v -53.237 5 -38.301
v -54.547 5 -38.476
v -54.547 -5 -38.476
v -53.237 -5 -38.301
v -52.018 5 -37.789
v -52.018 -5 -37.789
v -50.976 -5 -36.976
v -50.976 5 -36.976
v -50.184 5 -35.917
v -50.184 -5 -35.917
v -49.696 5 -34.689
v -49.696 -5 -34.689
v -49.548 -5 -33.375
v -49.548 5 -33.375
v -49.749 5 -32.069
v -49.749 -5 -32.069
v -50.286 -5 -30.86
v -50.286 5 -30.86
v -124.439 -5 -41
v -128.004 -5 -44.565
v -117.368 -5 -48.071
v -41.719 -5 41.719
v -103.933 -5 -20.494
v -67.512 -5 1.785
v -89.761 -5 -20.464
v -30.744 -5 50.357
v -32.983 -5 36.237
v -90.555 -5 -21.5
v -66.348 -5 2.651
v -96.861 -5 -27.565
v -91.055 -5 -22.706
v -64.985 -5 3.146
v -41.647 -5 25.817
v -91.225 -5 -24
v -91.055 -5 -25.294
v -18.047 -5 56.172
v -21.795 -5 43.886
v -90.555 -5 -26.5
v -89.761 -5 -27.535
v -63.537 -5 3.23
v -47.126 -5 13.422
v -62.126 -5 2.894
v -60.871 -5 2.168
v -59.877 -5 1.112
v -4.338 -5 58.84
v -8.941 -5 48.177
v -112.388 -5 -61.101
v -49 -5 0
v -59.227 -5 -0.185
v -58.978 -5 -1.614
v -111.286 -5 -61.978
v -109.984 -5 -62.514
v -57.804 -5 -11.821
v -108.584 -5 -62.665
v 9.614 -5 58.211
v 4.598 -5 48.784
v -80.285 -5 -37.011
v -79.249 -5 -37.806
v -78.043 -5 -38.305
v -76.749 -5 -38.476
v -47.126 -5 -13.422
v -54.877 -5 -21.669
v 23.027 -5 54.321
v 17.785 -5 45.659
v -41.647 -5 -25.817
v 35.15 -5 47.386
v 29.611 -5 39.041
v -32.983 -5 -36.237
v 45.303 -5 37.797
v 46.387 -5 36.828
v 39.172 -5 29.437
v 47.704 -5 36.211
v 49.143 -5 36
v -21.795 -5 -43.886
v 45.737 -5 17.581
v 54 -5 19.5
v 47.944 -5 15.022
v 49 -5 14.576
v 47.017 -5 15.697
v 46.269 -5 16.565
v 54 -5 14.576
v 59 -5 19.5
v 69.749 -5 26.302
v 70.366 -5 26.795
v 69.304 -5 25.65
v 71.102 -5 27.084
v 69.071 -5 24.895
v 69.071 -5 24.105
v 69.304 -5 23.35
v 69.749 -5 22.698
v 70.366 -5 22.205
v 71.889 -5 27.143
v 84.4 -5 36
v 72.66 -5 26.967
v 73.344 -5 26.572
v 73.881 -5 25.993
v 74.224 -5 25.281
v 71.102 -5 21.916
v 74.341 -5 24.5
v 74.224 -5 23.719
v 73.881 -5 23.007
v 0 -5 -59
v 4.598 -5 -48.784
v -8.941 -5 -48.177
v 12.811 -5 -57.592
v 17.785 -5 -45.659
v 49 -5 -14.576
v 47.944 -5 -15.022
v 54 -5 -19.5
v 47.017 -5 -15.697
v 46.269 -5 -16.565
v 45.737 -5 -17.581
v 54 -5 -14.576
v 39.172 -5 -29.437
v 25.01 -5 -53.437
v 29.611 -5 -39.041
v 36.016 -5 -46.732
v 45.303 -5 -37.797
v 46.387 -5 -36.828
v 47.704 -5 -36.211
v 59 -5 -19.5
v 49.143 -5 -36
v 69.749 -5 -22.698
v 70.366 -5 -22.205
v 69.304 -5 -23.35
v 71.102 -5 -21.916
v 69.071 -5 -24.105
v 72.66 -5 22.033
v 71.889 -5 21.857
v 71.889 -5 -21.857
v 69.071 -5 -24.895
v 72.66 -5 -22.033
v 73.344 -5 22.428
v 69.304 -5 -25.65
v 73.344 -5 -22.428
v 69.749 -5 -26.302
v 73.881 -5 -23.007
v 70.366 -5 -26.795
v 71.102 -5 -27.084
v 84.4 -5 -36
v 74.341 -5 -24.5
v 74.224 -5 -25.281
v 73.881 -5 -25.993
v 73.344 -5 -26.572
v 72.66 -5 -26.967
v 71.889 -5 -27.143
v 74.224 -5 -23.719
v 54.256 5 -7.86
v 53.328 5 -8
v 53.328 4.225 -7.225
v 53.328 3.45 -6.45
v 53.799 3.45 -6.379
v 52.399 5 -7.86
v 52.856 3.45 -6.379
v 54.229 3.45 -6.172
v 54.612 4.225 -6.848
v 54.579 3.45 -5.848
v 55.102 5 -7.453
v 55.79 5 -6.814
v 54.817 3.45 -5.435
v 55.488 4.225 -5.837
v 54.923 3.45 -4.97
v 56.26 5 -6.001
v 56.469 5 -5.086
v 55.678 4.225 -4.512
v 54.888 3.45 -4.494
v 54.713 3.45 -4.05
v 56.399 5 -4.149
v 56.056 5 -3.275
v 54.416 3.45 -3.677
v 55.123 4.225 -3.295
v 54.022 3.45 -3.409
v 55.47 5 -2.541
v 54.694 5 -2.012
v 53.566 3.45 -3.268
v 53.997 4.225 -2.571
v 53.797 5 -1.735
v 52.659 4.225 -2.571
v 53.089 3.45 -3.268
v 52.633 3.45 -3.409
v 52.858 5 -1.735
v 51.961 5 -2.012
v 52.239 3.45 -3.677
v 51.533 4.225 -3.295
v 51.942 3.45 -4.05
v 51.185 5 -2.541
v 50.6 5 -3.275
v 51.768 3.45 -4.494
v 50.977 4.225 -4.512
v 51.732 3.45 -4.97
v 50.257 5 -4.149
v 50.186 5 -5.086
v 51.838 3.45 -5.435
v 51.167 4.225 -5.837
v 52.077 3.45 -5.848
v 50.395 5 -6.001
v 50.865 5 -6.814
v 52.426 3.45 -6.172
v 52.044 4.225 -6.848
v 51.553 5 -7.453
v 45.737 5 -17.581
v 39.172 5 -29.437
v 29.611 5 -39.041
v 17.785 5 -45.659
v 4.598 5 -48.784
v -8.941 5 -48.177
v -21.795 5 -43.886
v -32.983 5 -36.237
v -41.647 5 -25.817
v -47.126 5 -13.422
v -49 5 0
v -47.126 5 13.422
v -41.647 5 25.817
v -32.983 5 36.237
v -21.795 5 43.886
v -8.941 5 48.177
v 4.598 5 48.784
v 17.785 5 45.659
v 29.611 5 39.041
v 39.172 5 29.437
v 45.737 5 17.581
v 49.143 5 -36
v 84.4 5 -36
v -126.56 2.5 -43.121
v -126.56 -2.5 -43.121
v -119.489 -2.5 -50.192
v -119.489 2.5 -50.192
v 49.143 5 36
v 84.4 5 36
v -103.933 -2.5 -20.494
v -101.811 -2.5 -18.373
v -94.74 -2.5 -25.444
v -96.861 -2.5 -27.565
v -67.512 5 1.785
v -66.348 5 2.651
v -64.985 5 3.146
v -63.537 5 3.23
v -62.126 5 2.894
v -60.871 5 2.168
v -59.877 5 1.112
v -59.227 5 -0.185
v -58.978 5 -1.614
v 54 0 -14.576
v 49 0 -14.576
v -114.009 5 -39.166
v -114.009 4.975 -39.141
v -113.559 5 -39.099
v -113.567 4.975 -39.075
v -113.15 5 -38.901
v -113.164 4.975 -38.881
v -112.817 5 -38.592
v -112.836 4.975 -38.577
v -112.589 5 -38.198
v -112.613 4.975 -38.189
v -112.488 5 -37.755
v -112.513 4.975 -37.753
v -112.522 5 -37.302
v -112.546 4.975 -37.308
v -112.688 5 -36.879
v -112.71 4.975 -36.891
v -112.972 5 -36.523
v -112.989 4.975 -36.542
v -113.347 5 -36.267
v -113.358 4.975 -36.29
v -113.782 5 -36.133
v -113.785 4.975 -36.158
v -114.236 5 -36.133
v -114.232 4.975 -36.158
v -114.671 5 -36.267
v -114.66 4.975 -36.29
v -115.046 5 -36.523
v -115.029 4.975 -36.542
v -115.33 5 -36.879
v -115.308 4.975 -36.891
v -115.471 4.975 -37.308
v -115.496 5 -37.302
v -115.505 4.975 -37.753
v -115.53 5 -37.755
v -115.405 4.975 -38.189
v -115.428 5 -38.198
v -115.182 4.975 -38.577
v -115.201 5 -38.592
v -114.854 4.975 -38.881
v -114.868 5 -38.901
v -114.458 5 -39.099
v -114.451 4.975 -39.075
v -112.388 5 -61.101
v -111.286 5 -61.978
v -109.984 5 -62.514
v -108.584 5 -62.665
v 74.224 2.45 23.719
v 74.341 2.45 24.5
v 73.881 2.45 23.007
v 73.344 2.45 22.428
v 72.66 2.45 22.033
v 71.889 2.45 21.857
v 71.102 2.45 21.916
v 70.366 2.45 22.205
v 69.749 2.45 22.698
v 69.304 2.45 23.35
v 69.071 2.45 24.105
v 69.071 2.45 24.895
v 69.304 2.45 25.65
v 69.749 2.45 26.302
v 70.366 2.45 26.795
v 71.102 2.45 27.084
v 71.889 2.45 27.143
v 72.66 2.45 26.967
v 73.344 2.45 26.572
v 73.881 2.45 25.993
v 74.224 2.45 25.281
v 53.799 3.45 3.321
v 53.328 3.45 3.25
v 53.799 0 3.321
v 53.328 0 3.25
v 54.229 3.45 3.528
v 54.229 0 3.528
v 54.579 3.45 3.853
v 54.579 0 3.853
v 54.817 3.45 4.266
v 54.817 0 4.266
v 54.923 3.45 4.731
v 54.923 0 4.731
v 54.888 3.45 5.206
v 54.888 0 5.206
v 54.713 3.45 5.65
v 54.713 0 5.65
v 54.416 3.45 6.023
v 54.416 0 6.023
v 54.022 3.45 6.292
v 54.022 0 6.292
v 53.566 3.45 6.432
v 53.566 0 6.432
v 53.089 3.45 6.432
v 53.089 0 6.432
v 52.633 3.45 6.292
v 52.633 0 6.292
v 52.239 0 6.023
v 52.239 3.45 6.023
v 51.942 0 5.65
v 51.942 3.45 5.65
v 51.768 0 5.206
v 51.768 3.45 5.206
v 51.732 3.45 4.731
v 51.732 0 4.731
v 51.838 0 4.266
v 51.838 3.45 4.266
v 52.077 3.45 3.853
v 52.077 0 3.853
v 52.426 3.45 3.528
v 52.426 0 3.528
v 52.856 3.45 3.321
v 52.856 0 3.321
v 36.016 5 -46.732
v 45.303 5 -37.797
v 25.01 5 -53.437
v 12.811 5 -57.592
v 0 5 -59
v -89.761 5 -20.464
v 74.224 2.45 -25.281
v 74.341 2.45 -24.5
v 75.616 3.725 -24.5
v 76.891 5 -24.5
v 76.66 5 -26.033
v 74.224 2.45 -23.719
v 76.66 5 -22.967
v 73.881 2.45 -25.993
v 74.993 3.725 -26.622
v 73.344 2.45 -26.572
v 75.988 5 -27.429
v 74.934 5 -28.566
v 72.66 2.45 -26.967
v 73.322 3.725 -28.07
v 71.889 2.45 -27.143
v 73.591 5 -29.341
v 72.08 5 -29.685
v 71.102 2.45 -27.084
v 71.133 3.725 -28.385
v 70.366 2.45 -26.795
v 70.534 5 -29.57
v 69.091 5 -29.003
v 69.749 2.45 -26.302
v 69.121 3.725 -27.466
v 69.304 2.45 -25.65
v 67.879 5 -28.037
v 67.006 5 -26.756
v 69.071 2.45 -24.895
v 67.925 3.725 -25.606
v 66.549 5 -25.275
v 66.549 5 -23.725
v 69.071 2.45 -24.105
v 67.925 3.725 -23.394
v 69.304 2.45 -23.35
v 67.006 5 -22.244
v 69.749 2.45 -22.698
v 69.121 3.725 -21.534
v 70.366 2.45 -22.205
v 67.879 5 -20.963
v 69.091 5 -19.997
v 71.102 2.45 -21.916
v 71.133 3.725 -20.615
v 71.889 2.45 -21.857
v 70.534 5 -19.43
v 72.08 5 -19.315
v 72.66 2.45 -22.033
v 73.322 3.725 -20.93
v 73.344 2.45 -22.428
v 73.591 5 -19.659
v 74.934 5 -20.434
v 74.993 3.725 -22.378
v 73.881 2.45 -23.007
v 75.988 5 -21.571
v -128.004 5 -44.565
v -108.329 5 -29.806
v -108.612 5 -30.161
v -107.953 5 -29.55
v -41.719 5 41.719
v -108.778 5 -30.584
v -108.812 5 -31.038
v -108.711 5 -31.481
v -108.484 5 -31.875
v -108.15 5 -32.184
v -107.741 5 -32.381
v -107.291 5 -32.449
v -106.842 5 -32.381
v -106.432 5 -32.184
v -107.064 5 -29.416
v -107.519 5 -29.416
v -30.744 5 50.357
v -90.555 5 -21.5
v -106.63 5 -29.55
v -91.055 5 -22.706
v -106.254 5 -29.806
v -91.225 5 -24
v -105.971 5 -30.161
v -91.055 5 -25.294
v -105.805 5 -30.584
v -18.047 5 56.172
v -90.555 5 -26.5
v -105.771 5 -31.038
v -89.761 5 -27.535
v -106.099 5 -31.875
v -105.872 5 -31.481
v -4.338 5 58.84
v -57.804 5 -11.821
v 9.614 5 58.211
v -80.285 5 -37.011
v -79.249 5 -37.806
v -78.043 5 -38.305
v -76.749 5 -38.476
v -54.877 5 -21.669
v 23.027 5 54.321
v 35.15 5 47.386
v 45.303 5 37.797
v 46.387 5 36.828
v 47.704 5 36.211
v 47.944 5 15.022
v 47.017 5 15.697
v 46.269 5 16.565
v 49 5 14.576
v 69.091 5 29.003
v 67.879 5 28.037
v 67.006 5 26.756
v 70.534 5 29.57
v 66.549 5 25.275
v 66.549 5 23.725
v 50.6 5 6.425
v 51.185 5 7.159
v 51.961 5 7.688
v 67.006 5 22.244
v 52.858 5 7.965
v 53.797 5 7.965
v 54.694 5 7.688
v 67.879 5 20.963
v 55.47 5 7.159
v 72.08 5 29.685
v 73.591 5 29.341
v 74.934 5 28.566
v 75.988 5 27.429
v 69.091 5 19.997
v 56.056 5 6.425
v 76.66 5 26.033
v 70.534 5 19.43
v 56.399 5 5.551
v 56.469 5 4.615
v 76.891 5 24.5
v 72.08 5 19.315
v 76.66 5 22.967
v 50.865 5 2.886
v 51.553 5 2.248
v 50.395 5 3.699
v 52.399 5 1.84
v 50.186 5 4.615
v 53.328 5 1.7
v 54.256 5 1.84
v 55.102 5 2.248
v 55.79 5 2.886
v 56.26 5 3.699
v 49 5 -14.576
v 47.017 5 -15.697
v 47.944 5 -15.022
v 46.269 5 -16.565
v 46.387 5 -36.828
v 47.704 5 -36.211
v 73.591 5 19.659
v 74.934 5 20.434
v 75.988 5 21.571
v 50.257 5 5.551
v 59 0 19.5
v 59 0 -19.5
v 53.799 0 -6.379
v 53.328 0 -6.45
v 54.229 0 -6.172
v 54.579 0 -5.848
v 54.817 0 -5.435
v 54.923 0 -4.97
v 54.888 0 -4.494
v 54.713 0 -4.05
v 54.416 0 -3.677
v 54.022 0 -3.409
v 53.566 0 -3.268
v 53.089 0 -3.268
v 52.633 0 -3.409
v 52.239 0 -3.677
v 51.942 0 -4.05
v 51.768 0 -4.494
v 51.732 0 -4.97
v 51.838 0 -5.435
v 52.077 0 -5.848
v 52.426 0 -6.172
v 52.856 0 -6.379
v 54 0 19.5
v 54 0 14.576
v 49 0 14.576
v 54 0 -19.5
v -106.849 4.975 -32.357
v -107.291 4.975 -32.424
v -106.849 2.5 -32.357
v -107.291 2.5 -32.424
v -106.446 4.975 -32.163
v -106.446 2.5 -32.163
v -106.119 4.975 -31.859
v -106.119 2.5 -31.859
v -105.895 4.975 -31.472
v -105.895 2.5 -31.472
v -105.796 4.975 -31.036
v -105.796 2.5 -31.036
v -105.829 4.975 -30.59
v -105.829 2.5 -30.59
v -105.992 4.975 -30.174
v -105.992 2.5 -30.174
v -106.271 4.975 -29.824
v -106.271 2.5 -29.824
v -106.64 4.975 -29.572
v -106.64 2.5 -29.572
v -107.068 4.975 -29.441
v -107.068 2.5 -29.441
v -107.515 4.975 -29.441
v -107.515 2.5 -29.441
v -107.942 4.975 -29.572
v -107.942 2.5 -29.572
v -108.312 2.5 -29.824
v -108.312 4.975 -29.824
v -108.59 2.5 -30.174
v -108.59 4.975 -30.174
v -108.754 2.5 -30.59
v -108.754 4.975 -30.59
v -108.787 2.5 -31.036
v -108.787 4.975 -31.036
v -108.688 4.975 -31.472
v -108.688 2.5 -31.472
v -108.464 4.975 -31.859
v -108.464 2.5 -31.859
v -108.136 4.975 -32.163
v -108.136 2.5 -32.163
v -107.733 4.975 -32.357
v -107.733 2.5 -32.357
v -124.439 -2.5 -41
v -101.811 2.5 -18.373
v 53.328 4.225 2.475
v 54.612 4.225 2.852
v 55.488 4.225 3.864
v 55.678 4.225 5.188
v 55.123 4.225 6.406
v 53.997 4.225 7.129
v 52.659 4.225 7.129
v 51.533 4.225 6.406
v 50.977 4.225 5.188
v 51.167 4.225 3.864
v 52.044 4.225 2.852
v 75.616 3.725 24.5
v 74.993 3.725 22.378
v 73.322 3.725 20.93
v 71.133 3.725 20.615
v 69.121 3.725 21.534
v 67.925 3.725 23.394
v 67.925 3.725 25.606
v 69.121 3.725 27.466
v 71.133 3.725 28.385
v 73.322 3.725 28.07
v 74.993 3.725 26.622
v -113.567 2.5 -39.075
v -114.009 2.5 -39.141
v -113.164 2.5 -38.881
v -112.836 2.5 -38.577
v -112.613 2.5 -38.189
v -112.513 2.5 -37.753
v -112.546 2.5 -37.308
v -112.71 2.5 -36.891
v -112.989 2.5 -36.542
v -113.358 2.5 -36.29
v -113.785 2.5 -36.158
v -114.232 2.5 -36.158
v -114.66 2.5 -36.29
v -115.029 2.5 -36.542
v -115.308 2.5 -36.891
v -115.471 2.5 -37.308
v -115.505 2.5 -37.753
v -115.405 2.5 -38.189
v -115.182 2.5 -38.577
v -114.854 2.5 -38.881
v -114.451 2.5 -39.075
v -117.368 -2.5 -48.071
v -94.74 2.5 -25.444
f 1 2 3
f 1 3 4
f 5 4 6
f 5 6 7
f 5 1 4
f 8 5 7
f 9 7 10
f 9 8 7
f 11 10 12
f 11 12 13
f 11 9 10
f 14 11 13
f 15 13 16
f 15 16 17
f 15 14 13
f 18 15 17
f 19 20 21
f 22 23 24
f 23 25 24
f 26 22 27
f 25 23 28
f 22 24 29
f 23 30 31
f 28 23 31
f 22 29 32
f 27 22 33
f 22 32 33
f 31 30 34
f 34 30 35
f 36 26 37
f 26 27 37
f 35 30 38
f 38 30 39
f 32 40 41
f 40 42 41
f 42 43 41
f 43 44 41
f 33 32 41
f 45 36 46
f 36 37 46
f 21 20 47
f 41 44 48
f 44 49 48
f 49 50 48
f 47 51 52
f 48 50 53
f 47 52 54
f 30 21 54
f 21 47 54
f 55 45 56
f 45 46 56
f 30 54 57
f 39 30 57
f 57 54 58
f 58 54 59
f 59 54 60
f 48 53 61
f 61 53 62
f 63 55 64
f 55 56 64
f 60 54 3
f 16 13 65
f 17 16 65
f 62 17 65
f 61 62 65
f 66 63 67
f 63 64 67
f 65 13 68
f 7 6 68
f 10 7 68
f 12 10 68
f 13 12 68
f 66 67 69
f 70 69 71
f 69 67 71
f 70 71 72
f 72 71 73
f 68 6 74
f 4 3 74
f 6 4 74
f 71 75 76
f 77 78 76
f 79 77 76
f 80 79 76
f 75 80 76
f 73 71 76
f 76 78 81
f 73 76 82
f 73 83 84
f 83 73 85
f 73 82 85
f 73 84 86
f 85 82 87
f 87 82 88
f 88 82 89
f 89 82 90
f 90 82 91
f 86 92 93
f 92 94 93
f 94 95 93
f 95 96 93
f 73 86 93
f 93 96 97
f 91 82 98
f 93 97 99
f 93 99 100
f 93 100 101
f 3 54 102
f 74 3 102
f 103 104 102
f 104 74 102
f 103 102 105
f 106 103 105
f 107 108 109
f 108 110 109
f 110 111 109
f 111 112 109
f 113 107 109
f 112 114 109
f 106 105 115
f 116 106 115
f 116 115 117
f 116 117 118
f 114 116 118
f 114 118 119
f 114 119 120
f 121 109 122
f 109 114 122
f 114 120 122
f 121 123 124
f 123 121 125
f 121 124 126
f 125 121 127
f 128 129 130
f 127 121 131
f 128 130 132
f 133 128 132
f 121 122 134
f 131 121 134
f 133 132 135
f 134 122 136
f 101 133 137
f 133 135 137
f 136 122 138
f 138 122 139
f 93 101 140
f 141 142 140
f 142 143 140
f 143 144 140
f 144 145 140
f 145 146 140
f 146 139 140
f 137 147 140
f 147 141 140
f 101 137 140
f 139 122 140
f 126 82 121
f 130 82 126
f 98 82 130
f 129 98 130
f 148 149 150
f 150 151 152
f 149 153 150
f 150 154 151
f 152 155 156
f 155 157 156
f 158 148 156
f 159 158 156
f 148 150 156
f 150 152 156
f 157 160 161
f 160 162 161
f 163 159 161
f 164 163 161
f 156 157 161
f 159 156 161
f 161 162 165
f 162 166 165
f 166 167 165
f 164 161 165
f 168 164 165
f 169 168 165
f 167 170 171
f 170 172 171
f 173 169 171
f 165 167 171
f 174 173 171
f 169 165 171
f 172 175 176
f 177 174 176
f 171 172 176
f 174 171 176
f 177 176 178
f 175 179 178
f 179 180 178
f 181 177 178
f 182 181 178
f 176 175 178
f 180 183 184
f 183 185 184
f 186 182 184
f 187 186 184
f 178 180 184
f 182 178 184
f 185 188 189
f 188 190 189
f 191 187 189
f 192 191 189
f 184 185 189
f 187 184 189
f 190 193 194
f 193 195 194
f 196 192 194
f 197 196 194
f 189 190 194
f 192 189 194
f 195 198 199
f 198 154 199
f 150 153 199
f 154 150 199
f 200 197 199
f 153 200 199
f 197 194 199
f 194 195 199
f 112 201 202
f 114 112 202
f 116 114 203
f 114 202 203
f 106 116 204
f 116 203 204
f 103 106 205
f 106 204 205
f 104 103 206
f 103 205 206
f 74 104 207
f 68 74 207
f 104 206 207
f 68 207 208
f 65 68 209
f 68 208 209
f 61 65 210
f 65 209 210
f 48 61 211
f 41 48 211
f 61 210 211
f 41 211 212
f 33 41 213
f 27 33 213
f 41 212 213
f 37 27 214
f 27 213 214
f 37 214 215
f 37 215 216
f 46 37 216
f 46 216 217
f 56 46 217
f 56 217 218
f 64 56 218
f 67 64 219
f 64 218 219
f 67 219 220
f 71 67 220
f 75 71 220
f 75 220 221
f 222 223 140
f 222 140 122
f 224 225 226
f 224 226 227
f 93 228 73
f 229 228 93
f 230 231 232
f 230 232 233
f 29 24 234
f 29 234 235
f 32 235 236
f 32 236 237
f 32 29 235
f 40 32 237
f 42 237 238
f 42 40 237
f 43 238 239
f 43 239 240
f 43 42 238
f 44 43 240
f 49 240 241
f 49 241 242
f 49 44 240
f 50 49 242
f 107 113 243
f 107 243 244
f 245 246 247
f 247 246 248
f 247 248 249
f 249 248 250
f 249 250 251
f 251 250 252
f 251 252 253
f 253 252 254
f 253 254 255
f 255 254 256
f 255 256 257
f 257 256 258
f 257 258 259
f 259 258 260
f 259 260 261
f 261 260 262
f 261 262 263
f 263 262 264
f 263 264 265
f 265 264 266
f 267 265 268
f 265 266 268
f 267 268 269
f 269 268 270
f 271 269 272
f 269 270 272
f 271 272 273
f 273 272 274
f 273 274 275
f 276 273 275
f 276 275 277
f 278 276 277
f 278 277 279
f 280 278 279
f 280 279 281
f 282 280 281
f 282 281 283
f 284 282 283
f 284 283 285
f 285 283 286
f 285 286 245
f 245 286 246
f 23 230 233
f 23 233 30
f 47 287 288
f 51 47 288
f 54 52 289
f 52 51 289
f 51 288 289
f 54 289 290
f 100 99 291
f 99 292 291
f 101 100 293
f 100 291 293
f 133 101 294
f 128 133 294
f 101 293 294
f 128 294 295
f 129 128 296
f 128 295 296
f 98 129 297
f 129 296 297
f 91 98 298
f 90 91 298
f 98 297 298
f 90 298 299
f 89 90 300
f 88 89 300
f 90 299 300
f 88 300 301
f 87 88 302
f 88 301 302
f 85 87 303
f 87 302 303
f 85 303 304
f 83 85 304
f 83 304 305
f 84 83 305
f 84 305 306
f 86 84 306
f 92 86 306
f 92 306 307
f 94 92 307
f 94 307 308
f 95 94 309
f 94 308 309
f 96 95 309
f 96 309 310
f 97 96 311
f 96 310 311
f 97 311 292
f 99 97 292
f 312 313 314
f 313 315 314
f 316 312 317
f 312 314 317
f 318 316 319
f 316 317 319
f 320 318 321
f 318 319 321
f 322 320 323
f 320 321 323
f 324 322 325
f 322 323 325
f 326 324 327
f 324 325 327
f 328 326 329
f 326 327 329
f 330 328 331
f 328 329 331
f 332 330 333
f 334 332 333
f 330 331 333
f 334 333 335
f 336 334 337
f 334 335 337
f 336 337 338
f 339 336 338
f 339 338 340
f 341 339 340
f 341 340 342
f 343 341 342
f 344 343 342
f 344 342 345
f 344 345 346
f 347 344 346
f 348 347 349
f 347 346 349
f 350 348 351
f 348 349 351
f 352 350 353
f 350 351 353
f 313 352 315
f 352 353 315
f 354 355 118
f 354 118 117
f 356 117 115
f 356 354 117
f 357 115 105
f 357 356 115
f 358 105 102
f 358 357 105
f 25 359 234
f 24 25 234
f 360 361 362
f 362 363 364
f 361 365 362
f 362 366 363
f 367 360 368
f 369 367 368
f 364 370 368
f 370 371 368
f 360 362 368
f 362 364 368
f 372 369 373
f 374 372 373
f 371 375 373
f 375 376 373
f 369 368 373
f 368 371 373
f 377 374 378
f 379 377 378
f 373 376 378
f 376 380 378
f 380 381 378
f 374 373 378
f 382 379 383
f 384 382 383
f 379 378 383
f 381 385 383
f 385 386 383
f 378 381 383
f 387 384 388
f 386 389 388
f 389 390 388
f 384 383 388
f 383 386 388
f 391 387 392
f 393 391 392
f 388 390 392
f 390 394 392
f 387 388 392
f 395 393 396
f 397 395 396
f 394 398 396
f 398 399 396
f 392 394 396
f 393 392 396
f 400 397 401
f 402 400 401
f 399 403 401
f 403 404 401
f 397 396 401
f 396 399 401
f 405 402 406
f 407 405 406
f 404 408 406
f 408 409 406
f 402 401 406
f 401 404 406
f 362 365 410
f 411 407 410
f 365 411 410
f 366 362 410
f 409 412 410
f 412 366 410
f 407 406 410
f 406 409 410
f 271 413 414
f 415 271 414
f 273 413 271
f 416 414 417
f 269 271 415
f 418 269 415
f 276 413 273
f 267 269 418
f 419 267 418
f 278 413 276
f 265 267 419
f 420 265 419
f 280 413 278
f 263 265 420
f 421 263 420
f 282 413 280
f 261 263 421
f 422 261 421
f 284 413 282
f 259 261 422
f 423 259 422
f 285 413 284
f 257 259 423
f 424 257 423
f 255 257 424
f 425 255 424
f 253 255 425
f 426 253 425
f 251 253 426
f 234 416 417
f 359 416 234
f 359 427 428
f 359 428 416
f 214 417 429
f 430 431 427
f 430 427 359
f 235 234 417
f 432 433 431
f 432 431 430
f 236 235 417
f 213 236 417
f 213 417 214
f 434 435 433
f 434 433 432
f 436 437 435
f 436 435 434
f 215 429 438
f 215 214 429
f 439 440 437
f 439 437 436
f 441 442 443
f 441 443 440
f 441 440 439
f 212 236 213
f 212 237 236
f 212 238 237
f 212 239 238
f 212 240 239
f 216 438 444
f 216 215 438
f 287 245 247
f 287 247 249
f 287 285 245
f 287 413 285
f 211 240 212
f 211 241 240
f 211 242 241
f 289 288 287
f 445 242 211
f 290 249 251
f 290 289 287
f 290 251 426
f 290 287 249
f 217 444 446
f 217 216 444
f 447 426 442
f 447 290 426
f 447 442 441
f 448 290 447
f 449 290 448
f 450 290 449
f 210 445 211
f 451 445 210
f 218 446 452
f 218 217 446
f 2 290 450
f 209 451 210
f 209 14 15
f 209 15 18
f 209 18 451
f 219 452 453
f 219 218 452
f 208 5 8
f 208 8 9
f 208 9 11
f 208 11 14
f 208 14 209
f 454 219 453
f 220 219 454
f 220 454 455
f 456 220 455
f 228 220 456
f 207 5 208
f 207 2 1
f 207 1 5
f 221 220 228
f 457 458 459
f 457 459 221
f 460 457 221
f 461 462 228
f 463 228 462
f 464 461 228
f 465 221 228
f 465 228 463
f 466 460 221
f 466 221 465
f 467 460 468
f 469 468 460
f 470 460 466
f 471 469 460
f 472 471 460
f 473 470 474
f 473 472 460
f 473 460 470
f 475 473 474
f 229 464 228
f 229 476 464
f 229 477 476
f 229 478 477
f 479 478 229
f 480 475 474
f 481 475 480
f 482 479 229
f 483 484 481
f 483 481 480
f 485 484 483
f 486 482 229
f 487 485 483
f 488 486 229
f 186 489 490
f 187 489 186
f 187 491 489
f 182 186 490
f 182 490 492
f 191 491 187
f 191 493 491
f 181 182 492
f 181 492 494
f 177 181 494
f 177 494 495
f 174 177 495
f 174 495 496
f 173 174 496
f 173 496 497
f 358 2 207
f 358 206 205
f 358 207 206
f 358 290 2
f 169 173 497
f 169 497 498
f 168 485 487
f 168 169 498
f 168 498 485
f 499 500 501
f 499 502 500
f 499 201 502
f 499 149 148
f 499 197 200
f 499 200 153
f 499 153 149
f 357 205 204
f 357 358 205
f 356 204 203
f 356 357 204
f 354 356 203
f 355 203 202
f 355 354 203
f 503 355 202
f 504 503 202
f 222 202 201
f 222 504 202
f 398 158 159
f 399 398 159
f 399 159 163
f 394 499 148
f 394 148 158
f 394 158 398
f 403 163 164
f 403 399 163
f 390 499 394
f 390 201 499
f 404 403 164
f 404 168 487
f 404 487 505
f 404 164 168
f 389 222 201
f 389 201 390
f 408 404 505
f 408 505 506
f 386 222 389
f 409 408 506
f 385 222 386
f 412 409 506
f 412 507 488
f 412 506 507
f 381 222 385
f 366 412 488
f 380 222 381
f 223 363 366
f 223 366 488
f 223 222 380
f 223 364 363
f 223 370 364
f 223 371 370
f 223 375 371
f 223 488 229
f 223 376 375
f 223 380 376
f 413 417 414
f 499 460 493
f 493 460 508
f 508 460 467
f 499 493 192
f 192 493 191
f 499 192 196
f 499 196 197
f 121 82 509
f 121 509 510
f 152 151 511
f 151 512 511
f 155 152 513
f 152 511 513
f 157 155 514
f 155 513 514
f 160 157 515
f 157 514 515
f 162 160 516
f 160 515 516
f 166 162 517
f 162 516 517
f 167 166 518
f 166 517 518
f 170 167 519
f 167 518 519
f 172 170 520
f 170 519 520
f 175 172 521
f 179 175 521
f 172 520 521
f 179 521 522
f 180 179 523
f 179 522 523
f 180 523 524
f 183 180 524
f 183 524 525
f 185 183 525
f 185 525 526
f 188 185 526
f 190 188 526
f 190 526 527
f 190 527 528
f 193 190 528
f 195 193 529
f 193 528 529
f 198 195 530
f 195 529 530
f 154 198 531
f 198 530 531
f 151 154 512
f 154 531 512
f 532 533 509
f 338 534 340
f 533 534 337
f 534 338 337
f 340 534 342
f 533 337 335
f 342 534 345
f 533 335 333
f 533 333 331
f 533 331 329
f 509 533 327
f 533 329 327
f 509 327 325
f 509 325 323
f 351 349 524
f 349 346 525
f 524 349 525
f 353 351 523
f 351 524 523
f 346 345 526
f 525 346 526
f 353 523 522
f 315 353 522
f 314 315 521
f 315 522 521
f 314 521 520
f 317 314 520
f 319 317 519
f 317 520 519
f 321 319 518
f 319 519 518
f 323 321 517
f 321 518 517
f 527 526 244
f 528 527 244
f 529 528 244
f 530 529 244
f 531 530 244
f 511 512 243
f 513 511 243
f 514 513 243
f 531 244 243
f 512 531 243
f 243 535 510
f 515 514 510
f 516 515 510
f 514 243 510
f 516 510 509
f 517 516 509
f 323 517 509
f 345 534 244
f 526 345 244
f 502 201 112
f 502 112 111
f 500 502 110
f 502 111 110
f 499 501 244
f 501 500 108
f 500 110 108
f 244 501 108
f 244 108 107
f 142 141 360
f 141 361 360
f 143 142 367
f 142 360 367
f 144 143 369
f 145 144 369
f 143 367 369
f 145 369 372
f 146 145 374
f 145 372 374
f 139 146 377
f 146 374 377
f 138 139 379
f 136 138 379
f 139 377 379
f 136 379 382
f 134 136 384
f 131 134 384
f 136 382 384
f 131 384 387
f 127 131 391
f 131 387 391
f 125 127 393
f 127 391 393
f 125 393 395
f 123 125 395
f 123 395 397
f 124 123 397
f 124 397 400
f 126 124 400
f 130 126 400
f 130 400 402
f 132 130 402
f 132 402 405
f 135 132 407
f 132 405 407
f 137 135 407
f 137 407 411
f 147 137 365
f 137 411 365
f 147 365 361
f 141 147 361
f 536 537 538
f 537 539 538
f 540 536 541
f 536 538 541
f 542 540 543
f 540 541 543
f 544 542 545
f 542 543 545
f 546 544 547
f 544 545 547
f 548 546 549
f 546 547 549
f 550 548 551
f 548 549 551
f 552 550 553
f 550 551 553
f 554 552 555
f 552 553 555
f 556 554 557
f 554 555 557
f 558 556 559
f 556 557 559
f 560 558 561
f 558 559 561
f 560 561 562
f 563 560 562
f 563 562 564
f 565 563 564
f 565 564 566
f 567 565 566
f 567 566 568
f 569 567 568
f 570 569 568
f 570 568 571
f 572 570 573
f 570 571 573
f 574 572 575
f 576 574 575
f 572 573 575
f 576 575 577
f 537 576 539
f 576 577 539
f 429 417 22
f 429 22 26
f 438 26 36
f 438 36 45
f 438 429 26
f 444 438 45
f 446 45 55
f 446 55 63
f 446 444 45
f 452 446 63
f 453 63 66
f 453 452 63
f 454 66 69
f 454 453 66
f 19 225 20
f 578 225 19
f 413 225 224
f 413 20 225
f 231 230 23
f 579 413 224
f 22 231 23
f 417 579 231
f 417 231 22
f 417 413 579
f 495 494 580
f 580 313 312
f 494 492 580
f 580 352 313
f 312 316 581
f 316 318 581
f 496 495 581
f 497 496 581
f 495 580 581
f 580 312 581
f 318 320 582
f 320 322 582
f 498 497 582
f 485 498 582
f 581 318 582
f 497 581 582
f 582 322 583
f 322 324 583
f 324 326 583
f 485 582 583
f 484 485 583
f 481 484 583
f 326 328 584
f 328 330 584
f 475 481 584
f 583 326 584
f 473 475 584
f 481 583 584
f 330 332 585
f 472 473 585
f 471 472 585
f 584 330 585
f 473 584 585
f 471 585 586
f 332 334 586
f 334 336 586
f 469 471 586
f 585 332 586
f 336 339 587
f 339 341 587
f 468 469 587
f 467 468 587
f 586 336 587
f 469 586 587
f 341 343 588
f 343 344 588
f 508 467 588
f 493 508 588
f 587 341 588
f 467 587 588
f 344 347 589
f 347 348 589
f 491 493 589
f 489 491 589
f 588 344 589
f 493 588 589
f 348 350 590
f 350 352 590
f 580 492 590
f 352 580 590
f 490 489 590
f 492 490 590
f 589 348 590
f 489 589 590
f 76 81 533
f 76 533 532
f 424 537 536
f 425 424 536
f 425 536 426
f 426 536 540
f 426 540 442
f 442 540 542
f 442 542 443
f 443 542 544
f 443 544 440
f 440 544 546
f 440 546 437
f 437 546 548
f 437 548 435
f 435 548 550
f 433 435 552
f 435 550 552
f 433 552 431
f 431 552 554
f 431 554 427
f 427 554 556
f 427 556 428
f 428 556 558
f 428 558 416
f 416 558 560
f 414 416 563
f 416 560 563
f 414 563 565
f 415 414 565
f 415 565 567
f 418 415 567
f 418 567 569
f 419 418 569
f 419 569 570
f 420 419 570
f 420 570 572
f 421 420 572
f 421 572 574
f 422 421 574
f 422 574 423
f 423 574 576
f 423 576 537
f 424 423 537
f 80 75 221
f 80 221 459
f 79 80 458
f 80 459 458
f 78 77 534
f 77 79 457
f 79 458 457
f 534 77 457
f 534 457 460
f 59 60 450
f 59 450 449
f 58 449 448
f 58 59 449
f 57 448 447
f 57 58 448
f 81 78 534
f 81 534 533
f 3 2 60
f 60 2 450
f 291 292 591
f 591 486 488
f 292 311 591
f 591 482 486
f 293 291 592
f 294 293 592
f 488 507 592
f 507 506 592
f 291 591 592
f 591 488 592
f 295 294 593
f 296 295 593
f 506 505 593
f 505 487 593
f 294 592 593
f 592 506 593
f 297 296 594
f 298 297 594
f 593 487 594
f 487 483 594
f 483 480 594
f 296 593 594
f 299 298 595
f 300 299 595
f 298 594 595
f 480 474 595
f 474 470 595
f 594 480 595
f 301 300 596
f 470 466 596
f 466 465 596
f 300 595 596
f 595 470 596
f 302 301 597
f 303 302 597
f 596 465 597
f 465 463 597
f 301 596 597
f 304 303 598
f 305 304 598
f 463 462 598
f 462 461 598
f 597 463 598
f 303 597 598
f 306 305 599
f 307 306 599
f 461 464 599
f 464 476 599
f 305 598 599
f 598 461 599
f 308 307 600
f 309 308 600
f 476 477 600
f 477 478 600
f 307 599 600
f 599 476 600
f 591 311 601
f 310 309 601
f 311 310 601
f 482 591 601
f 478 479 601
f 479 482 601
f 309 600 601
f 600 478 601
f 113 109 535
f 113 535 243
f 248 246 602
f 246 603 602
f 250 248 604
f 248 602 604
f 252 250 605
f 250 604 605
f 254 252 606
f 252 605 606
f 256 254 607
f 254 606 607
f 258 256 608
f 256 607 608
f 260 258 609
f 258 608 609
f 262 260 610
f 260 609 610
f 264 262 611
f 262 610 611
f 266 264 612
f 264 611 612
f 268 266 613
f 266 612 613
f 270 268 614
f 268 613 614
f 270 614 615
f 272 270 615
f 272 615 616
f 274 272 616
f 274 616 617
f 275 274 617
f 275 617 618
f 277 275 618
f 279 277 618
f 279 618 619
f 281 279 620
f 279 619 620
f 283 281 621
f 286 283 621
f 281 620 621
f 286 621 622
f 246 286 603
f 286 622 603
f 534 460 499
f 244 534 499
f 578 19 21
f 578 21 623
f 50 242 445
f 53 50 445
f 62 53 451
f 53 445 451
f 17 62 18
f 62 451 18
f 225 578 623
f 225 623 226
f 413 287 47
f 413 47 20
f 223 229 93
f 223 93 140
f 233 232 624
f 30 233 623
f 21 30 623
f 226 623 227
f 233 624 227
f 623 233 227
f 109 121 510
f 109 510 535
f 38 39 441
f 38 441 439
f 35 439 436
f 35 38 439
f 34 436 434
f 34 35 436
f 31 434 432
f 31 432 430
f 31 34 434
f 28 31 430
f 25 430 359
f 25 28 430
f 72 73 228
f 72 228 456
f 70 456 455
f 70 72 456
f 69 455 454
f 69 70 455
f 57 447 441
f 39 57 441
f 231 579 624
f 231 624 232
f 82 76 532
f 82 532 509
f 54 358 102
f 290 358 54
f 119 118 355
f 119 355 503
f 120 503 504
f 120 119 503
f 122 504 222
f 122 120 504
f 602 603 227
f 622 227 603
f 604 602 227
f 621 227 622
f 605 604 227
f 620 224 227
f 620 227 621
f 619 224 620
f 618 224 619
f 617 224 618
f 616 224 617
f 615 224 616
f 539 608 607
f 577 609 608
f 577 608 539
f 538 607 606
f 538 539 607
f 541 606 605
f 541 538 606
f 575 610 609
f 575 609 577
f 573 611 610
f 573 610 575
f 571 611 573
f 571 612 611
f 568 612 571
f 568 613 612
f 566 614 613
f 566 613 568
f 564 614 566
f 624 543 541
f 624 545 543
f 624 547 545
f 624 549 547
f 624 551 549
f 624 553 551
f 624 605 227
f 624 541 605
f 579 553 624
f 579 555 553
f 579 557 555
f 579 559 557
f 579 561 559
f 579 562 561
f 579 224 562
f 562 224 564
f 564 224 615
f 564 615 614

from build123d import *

# Parameters (mm, degrees)
BOSS_EXTRUDE1_DEPTH                             = 5
FILLET1_R                                       = 5
CUT_EXTRUDE1_DEPTH                              = 10
F_3_0MM_PRESS_DOWEL_HOLE2_D                     = 3
F_3_0MM_PRESS_DOWEL_HOLE2_CSINK_D               = 3.05
F_3_0MM_PRESS_DOWEL_HOLE2_CSINK_ANGLE           = 90
CUT_EXTRUDE2_DEPTH                              = 5
CSK_FOR_M3_FLAT_HEAD_MACHINE_SCREW2_D           = 3.2
CSK_FOR_M3_FLAT_HEAD_MACHINE_SCREW2_CSINK_D     = 6.3
CSK_FOR_M3_FLAT_HEAD_MACHINE_SCREW2_CSINK_ANGLE = 90


with BuildPart() as part:
    # Sketch1 → Boss-Extrude1 (new, symmetric)
    with BuildSketch(Plane(origin=(0, 0, 0), x_dir=(1, 0, 0), z_dir=(0, 1, 0))):
        with BuildLine():
            Line((-107.462553071, 24.023952891), (-41.71930009, -41.71930009))
            ThreePointArc((-41.71930009, -41.71930009), (3.806502253, -58.877079926), (46.74398357, -36))
            Line((46.74398357, -36), (84.4, -36))
            Line((84.4, -36), (84.4, 36))
            Line((84.4, 36), (46.74398357, 36))
            ThreePointArc((46.74398357, 36), (26.048032555, 52.93864373), (0, 59))
            Line((0, 59), (-110.83863918, 62.740943777))
            Line((-110.83863918, 62.740943777), (-128.004005064, 44.565404884))
            Line((-128.004005064, 44.565404884), (-107.462553071, 24.023952891))
        make_face()
        with BuildLine():
            Line((49, 14.576290822), (46.781745862, 14.576290822))
            ThreePointArc((46.781745862, 14.576290822), (-49, 0), (46.781745862, -14.576290822))
            Line((46.781745862, -14.576290822), (49, -14.576290822))
            Line((49, -14.576290822), (49, 14.576290822))
        make_face(mode=Mode.SUBTRACT)
        with BuildLine():
            Line((-93.296148974, 23.999684418), (-57.886132355, -11.410332201))
            ThreePointArc((-57.886132355, -11.410332201), (-57.048958802, 15.047135926), (-44.728269399, 38.475731527))
            Line((-44.728269399, 38.475731527), (-78.820101865, 38.475731527))
            Line((-78.820101865, 38.475731527), (-93.296148974, 23.999684418))
        make_face(mode=Mode.SUBTRACT)
    extrude(amount=BOSS_EXTRUDE1_DEPTH, both=True)

    # Fillet1
    # the kernel refuses this fillet: 5 mm, written as the material it adds along each edge
    with BuildSketch(Plane(origin=(46.74398357, -5, 36), x_dir=(1, 0, 0), z_dir=(0, 1, 0))) as fillet1_piece_1:
        with BuildLine():
            CenterArc((2.398665931, -5), FILLET1_R, 90, 50.161560023)
            ThreePointArc((-1.440603561, -1.796875), (-0.711533327, -0.905467408), (0, 0))
            Line((0, 0), (2.398665931, 0))
        make_face()
    extrude(amount=10)
    with BuildSketch(Plane(origin=(46.74398357, -5, -36), x_dir=(-0.6255163967442842, 0, -0.7802110210731757), z_dir=(0, 1, 0))) as fillet1_piece_2:
        with BuildLine():
            CenterArc((2.400650235, -4.999047579), FILLET1_R, 91.118340331, 50.161560023)
            Line((-1.50040487, -1.871465595), (0, 0))
            ThreePointArc((0, 0), (1.151531414, -0.011238567), (2.303062827, 0))
        make_face()
    extrude(amount=10)
    with BuildSketch(Plane(origin=(-93.296148974, -5, -23.999684418), x_dir=(0.7071067811865472, 0, -0.7071067811865479), z_dir=(0, 1, 0))) as fillet1_piece_3:
        with BuildLine():
            CenterArc((FILLET1_R, -FILLET1_R), FILLET1_R, 90, 90)
            Line((0, -FILLET1_R), (0, 0))
            Line((0, 0), (FILLET1_R, 0))
        make_face()
    extrude(amount=10)
    with BuildSketch(Plane(origin=(-78.820101865, -5, -38.475731527), x_dir=(1, 0, 0), z_dir=(0, 1, 0))) as fillet1_piece_4:
        with BuildLine():
            CenterArc((FILLET1_R * 0.414213562373, -FILLET1_R), FILLET1_R, 90, 45)
            Line((-FILLET1_R * 0.292893218813, -FILLET1_R * 0.292893218813), (0, 0))
            Line((0, 0), (FILLET1_R * 0.414213562373, 0))
        make_face()
    extrude(amount=10)
    with BuildSketch(Plane(origin=(-57.886132355, -5, 11.410332201), x_dir=(-0.7071067811865467, 0, -0.7071067811865482), z_dir=(0, 1, 0))) as fillet1_piece_5:
        with BuildLine():
            CenterArc((13.612446704, -5), FILLET1_R, 90, 133.432536558)
            ThreePointArc((9.981524817, -8.4375), (5.225121697, -3.941504009), (0, 0))
            Line((0, 0), (13.612446704, 0))
        make_face()
    extrude(amount=10)
    with BuildSketch(Plane(origin=(-44.728269399, 5, -38.475731527), x_dir=(-1, 0, 0), z_dir=(0, -1, 0))) as fillet1_piece_6:
        with BuildLine():
            CenterArc((9.81873234, -5), FILLET1_R, 90, 121.53762105)
            ThreePointArc((5.557247829, -7.615291526), (2.930969774, -3.696471595), (0, 0))
            Line((0, 0), (9.81873234, 0))
        make_face()
    extrude(amount=10)
    # the kernel refuses this fillet: 5 mm, written as the material it takes off along each edge
    with BuildSketch(Plane(origin=(46.781745862, 12.95259813, 14.576290822), x_dir=(-0.32830869078175484, 0, 0.9445704862831413), z_dir=(0, -1, 0)), Plane(origin=(46.781745862, -12.95259813, -14.576290822), x_dir=(-0.32830869078175745, 0, -0.9445704862831404), z_dir=(0, 1, 0))) as fillet1_2_piece_1:
        with BuildLine():
            CenterArc((3.343337173, -4.997365244), FILLET1_R, 91.860123923, 52.660239811)
            Line((-0.728272112, -2.09529739), (0, 0))
            ThreePointArc((0, 0), (1.590519626, -0.025820606), (3.181039252, 0))
        make_face()
    extrude(amount=25.90519626, mode=Mode.SUBTRACT)
    with BuildSketch(Plane(origin=(-110.83863918, 10.640073082, -62.740943777), x_dir=(-0.6866146353868613, 0, 0.7270215557138366), z_dir=(0, -1, 0))) as fillet1_2_piece_2:
        with BuildLine():
            CenterArc((FILLET1_R * 0.451205846565, -FILLET1_R), FILLET1_R, 90, 48.570349235)
            Line((-FILLET1_R * 0.298562891452, -FILLET1_R * 0.338300038165), (0, 0))
            Line((0, 0), (FILLET1_R * 0.451205846565, 0))
        make_face()
    extrude(amount=21.280146164, mode=Mode.SUBTRACT)

    # Sketch11 → Cut-Extrude1 (cut)
    with BuildSketch(Plane(origin=(-41.71930009, 0, 41.71930009), x_dir=(0.7071067811865458, 0, 0.7071067811865492), z_dir=(-0.7071067811865492, 0, 0.7071067811865458))):
        Polygon((-116.982839598, -5), (-116.982839598, -2.5), (-119.982839598, -2.5), (-119.982839598, 2.5), (-84.982839598, 2.5), (-84.982839598, -2.5), (-87.982839598, -2.5), (-87.982839598, -5), align=None)
    extrude(amount=-CUT_EXTRUDE1_DEPTH, mode=Mode.SUBTRACT)

    # Ø3.0mm Press Dowel Hole2 (through all)
    with Locations(Plane(origin=(-114.00883423, 5, -37.641301862), x_dir=(0, 0, 1), z_dir=(0, 1, 0))):
        with Locations((0, 0), (6.717514422, 6.717514421)):
            CounterSinkHole(F_3_0MM_PRESS_DOWEL_HOLE2_D / 2, F_3_0MM_PRESS_DOWEL_HOLE2_CSINK_D / 2, counter_sink_angle=F_3_0MM_PRESS_DOWEL_HOLE2_CSINK_ANGLE)

    # Sketch15 → Cut-Extrude2 (cut)
    with BuildSketch(Plane(origin=(0, -5, 0), x_dir=(-1, 0, 0), z_dir=(0, -1, 0))):
        Polygon((-49, -14.576290822), (-54, -14.576290822), (-54, -19.5), (-59, -19.5), (-59, 19.5), (-54, 19.5), (-54, 14.576290822), (-49, 14.576290822), align=None)
    extrude(amount=-CUT_EXTRUDE2_DEPTH, mode=Mode.SUBTRACT)

    # CSK for M3 Flat Head Machine Screw2 (through all)
    with Locations(Plane(origin=(53.32762779, 5, -4.850211012), x_dir=(0, 0, 1), z_dir=(0, 1, 0))):
        with Locations((0, 0), (9.700422024, 0)):
            CounterSinkHole(CSK_FOR_M3_FLAT_HEAD_MACHINE_SCREW2_D / 2, CSK_FOR_M3_FLAT_HEAD_MACHINE_SCREW2_CSINK_D / 2, counter_sink_angle=CSK_FOR_M3_FLAT_HEAD_MACHINE_SCREW2_CSINK_ANGLE)

    # CSK for M5 Flat Head Machine Screw2: read off the stored shape, not the designer's step
    # CSK for M5 Flat Head Machine Screw2 outl → CSK for M5 Flat Head Machine Screw2 (revolve, cut)
    with BuildSketch(Plane(origin=(71.691354027, 0, 24.5), x_dir=(1, 0, 0), z_dir=(0, 0, 1))):
        Polygon((0, -5), (2.65, -5), (2.65, 2.45), (5.2, 5), (0, 5), align=None)
    revolve(axis=Axis((71.691354027, 0, 24.5), (0, 1, 0)), mode=Mode.SUBTRACT)

    # CSK for M5 Flat Head Machine Screw2 2 ou → CSK for M5 Flat Head Machine Screw2 2 (revolve, cut)
    with BuildSketch(Plane(origin=(71.691354027, 0, -24.5), x_dir=(1, 0, 0), z_dir=(0, 0, 1))):
        Polygon((0, -5), (2.65, -5), (2.65, 2.45), (5.2, 5), (0, 5), align=None)
    revolve(axis=Axis((71.691354027, 0, -24.5), (0, 1, 0)), mode=Mode.SUBTRACT)


solid = part.part
